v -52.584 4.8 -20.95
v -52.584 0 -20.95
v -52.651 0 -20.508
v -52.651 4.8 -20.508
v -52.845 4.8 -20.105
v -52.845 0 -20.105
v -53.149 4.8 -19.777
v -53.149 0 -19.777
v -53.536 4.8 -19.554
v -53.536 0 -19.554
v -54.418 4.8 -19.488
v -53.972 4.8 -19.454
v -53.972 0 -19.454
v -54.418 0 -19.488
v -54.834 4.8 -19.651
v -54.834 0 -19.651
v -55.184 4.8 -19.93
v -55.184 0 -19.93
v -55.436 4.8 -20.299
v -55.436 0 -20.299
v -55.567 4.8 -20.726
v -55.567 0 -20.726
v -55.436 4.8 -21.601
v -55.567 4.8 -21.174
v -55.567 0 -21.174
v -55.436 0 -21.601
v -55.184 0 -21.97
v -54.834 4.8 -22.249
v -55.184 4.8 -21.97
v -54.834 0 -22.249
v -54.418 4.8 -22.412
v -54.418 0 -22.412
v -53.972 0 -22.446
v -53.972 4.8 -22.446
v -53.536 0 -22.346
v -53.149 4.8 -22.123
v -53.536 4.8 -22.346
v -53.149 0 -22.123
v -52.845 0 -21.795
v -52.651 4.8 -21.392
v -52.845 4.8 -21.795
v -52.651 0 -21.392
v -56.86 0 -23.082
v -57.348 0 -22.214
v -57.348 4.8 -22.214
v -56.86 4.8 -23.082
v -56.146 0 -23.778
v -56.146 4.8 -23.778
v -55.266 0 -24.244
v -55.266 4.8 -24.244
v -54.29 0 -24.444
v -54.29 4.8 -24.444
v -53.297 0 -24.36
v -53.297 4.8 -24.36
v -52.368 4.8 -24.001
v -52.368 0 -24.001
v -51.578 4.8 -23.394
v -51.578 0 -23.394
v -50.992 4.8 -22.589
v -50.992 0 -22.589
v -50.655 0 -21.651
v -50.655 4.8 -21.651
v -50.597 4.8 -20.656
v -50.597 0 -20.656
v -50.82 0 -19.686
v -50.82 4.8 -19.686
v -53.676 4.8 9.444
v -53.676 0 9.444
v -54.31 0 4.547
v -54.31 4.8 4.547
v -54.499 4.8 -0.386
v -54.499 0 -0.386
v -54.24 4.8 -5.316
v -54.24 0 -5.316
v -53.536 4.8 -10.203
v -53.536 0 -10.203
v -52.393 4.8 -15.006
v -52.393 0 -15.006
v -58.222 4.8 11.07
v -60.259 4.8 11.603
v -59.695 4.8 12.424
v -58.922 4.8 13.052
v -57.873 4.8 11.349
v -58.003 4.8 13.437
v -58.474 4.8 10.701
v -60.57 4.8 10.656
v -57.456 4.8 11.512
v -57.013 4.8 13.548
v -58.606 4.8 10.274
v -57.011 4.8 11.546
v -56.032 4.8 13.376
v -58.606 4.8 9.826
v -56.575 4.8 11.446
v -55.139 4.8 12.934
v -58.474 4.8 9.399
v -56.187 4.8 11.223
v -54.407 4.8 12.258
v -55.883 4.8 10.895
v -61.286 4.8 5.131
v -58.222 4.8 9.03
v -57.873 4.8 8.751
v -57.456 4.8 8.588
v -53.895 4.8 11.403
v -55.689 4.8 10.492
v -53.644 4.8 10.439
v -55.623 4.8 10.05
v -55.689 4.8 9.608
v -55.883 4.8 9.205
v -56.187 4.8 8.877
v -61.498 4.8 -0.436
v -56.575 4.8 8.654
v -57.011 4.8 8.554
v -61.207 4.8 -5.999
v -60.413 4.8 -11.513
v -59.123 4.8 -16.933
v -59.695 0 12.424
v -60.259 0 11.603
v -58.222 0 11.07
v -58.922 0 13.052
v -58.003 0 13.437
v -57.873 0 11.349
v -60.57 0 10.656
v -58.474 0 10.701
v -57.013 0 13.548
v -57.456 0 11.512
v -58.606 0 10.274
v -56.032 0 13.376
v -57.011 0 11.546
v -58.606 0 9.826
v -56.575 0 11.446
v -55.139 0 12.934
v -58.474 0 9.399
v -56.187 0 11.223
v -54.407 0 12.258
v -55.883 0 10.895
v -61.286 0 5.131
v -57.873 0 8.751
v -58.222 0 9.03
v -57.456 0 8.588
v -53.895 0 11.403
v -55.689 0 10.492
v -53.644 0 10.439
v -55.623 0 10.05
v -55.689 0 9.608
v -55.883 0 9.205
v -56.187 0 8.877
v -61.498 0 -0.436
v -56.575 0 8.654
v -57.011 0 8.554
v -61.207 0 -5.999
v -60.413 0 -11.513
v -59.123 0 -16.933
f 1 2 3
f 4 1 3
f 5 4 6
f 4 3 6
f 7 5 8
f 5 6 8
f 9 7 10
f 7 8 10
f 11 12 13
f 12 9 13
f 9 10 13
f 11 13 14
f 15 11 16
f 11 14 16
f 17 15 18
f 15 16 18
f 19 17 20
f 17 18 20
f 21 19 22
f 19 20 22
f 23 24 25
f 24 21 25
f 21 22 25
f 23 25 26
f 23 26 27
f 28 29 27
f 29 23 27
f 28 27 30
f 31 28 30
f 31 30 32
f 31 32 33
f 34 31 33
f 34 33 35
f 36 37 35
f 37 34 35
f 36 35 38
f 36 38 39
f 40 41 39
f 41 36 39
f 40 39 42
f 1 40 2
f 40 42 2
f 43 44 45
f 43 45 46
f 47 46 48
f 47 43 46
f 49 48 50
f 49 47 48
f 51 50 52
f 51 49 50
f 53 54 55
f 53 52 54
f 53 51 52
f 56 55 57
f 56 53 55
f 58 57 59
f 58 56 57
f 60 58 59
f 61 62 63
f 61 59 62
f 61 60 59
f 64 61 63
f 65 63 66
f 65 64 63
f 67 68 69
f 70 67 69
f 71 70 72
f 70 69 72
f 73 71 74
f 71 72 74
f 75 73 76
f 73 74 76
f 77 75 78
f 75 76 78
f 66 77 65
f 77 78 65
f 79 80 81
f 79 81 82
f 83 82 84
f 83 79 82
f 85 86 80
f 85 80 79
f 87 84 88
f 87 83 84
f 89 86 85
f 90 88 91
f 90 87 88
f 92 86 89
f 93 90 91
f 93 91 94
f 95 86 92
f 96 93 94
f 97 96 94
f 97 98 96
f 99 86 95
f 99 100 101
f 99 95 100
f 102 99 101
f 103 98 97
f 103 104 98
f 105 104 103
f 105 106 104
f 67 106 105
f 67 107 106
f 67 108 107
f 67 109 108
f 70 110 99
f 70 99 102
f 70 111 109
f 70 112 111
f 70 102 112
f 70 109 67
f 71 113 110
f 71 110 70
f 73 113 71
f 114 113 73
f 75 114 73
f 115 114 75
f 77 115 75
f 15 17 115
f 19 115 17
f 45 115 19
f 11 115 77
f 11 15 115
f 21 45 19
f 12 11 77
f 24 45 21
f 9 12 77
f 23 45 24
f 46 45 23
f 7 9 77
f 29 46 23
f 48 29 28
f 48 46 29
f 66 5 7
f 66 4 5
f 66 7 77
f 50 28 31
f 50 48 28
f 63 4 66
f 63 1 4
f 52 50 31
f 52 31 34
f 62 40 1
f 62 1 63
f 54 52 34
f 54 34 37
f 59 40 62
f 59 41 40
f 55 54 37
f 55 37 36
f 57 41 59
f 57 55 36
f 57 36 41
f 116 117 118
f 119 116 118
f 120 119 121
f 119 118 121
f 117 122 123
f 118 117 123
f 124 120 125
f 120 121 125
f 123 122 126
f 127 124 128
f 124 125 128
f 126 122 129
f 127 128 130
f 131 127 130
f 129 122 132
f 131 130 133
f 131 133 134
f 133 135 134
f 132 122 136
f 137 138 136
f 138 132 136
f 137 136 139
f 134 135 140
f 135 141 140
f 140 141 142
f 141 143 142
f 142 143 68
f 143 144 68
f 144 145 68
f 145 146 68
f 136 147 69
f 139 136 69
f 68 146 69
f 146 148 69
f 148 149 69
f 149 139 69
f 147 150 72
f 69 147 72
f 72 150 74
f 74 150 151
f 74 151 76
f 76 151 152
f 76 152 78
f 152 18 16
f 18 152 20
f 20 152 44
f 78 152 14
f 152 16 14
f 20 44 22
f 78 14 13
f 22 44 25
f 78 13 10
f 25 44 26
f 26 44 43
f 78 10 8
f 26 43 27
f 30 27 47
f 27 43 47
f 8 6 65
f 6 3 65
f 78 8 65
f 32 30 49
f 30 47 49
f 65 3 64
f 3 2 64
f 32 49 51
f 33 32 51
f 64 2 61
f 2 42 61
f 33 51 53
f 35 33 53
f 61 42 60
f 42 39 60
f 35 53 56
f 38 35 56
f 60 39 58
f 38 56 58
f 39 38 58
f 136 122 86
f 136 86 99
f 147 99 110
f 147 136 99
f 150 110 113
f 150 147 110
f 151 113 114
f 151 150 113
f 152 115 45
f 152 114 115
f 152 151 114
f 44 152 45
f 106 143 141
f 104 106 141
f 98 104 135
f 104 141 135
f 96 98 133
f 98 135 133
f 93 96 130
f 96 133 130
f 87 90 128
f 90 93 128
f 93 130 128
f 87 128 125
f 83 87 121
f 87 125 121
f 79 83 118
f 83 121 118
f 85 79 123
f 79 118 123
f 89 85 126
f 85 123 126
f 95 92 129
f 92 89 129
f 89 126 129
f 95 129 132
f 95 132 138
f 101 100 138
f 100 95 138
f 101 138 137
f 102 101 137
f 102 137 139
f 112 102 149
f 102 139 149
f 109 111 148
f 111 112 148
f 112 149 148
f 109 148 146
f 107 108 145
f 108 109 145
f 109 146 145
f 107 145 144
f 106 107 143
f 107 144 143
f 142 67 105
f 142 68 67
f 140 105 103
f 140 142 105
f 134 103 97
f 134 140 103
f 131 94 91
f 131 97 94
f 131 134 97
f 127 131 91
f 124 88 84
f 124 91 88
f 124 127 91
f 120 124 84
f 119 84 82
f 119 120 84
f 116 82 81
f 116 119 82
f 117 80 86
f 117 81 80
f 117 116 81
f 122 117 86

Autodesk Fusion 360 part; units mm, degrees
sketch "Sketch1" plane through (0, 0, 0) normal (0, 1, 0) x (1, 0, 0)
  circle A0 centre (0, 0) radius 14 construction
  line L0 (0, 0) -> (0, 52) construction
  circle A1 centre (0, 0) radius 58 construction
  line L1 (0, 0) -> (-58, 0) construction
  line L2 (-61.5, 0) -> (-54.5, 0) construction
  line L3 (-52.0547, 32.75) -> (-43.5625, 32.75) construction
  line L4 (-54.7818, 27.95) -> (-46.7873, 27.95) construction
  line L5 (-59.0893, -17.05) -> (-51.7643, -17.05) construction
  circle A2 centre (-57.1227, -10.05) radius 1.5
  circle A3 centre (-54.0842, 20.95) radius 1.5
  arc A4 (-50.8205, 19.6858) -> (-57.3479, 22.2142) centre (-54.0842, 20.95) ccw
  arc A5 (-57.3479, 22.2142) -> (-55.2493, 17.6496) centre (-54.0842, 20.95) ccw construction
  arc A6 (-55.2493, 17.6496) -> (-50.8205, 19.6858) centre (-54.0842, 20.95) ccw construction
  arc A7 (-60.5697, -10.6565) -> (-53.6756, -9.4435) centre (-57.1227, -10.05) ccw
  arc A8 (-57.6248, -6.5862) -> (-60.5697, -10.6565) centre (-57.1227, -10.05) ccw construction
  arc A9 (-53.6756, -9.4435) -> (-57.6248, -6.5862) centre (-57.1227, -10.05) ccw construction
  arc A10 (-60.5697, -10.6565) -> (-59.0893, -17.05) centre (0, 0) ccw construction
  arc A11 (-53.6756, -9.4435) -> (-51.7643, -17.05) centre (0, 0) ccw construction
  arc A12 (-51.7643, -17.05) -> (-46.7873, 27.95) centre (0, 0) ccw construction
  arc A13 (-50.8205, 19.6858) -> (-53.6756, -9.4435) centre (0, 0) ccw
  arc A14 (-46.7873, 27.95) -> (-50.8205, 19.6858) centre (0, 0) ccw construction
  arc A15 (-59.0893, -17.05) -> (-54.7818, 27.95) centre (0, 0) ccw construction
  arc A16 (-57.3479, 22.2142) -> (-60.5697, -10.6565) centre (0, 0) ccw
  arc A17 (-54.7818, 27.95) -> (-57.3479, 22.2142) centre (0, 0) ccw construction
  point P0 (0, 14)
  point P1 (-58, 0)
  point P2 (-54.0842, 20.95)
  point P3 (-57.1227, -10.05)
  dimension "d6" = 28
  dimension "d7" = 38
  dimension "d8" = 116
  dimension "d9" = 7
  dimension "d10" = 19.25
  dimension "d11" = 4.8
  dimension "d12" = 7
  dimension "d13" = 45
  dimension "d14" = 7
  dimension "d15" = 3
  dimension "d16" = 3
extrude "Extrude1" add sketch "Sketch1" along normal blind 4.8
